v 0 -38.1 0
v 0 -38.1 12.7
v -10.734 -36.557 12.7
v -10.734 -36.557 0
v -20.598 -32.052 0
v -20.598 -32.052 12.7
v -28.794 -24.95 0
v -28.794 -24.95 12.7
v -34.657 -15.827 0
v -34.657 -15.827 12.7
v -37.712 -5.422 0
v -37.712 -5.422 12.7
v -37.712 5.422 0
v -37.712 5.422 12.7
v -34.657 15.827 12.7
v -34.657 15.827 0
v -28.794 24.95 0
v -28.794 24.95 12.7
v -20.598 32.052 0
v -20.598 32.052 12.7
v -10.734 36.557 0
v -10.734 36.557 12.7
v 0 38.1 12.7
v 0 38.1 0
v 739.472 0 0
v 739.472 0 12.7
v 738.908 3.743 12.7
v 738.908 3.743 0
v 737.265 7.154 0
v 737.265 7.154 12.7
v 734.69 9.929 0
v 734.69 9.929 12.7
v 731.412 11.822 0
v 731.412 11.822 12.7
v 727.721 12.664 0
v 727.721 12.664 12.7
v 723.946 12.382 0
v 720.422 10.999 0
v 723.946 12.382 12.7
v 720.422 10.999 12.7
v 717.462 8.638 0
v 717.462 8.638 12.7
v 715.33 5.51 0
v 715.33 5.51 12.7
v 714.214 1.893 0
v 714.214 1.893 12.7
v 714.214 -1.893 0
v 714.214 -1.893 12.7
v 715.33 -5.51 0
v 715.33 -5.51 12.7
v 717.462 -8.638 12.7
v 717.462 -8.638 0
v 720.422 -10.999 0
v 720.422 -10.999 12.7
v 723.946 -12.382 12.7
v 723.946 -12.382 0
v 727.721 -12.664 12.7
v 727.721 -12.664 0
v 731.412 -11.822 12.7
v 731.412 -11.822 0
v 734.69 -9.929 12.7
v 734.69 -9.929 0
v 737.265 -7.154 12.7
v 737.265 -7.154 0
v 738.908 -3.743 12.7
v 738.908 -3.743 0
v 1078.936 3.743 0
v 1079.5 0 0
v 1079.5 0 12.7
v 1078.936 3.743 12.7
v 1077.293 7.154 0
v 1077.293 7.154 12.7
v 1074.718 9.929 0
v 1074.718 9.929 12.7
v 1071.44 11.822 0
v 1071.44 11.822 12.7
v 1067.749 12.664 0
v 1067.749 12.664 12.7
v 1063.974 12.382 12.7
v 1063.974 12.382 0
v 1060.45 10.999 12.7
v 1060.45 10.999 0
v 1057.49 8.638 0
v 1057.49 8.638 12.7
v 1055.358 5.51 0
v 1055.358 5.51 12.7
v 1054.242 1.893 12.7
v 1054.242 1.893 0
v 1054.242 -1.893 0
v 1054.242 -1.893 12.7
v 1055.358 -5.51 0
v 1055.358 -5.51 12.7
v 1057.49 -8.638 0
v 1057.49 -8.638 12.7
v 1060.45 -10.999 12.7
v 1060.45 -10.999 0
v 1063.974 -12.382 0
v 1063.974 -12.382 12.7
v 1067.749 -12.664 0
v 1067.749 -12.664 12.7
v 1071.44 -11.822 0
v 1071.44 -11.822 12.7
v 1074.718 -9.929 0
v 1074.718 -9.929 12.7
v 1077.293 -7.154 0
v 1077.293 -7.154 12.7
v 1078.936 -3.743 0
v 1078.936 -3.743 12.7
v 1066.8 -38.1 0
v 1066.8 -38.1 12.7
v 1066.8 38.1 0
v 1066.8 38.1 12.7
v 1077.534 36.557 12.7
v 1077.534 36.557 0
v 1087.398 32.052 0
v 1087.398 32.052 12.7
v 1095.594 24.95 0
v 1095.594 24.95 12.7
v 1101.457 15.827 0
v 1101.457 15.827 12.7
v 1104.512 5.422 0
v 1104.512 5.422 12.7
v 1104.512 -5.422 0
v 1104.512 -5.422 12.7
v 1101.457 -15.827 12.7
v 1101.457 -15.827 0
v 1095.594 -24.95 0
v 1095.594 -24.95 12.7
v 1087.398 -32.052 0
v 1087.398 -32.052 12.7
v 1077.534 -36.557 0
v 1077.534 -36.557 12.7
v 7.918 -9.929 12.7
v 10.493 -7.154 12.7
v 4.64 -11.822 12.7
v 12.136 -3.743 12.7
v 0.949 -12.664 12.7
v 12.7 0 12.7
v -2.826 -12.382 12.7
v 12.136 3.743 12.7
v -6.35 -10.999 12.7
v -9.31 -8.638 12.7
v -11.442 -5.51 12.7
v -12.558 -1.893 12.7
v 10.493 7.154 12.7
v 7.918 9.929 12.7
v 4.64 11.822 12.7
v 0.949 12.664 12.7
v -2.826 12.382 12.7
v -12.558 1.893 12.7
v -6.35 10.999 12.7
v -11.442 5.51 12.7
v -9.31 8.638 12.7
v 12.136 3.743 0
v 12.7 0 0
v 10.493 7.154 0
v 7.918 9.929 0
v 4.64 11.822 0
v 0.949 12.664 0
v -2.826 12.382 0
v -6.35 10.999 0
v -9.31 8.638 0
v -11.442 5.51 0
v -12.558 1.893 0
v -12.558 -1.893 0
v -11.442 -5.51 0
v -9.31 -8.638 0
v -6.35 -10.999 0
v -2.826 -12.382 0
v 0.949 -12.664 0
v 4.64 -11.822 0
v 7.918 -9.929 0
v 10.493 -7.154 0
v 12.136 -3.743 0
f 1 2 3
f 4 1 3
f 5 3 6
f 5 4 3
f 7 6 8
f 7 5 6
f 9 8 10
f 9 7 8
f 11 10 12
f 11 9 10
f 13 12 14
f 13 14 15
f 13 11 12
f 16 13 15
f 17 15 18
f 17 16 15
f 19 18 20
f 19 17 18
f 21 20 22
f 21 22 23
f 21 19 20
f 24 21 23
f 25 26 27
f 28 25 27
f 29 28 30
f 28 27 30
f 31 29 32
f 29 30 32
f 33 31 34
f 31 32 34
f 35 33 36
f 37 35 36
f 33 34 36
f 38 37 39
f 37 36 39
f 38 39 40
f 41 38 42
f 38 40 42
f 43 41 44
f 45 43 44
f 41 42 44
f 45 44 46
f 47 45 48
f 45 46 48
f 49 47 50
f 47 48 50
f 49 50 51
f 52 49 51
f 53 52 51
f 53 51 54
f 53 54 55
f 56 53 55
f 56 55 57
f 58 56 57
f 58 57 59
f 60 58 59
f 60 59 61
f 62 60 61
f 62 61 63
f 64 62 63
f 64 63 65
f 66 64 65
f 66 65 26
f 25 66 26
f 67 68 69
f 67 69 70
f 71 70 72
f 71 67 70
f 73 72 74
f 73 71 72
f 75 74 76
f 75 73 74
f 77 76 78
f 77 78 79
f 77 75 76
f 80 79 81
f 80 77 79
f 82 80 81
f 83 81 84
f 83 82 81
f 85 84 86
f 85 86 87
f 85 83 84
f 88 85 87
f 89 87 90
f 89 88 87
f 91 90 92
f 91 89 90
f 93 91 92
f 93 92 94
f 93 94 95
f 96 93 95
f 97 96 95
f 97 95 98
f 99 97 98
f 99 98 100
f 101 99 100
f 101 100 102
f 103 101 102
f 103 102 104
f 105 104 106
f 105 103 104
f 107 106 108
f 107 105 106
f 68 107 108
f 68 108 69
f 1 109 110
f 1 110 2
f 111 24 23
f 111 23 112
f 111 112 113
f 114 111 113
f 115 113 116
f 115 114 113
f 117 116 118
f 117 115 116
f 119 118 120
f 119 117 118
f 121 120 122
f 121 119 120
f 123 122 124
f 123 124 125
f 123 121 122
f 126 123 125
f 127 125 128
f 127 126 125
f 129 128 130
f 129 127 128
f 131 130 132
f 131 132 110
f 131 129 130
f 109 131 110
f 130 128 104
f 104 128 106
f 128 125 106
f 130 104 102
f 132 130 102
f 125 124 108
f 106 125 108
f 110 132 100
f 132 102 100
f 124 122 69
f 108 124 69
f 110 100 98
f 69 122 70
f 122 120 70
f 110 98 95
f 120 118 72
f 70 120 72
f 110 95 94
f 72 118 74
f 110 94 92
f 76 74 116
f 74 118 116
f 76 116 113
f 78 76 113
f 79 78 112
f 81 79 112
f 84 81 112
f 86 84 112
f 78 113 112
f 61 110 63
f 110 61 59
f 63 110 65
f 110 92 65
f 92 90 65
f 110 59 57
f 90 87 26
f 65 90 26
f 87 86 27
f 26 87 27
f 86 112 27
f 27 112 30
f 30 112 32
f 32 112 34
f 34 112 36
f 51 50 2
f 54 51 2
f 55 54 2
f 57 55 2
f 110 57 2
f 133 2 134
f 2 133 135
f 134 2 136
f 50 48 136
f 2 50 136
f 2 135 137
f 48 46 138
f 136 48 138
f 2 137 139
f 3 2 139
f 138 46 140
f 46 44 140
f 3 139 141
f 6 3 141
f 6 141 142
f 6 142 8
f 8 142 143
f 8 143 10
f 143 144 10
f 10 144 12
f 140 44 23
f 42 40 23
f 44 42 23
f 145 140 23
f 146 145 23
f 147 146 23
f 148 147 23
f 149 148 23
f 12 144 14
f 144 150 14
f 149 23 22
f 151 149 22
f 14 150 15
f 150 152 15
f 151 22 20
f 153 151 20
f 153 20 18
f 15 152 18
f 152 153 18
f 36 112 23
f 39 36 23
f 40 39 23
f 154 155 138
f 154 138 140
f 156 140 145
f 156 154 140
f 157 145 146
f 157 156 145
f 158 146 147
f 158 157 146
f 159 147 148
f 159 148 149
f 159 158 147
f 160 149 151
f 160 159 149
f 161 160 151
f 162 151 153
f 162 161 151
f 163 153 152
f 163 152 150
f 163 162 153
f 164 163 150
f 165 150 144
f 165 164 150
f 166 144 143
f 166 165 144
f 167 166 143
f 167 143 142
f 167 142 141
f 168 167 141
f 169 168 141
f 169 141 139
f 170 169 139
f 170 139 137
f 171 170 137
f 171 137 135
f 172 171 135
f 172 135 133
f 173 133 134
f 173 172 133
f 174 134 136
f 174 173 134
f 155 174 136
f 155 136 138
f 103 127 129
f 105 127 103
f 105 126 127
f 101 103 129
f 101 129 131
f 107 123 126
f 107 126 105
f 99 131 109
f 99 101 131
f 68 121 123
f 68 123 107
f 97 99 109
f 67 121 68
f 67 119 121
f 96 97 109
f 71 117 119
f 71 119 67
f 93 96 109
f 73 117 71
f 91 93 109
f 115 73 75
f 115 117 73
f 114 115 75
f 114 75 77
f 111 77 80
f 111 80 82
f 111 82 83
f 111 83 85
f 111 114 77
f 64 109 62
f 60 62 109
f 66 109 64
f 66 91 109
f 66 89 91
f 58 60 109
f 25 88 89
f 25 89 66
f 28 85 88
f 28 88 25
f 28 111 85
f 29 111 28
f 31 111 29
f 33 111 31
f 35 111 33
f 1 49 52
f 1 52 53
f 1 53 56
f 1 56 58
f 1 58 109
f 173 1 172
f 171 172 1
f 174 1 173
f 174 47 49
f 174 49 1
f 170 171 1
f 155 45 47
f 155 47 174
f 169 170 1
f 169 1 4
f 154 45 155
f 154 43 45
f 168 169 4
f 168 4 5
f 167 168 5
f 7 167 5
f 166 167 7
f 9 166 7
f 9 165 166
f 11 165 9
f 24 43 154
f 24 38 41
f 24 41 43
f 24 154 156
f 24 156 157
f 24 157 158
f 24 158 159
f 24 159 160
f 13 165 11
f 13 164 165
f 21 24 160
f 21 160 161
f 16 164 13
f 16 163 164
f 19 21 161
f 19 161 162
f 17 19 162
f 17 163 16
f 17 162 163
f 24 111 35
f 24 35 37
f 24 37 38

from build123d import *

# Parameters (mm, degrees)
SKETCH2_R           = 12.7
BOSS_EXTRUDE1_DEPTH = 12.7
SKETCH3_R           = 12.7
CUT_EXTRUDE1_DEPTH  = 13.7


with BuildPart() as part:
    # Sketch2 → Boss-Extrude1 (new body)
    with BuildSketch(Plane.XY):
        with BuildLine():
            Line((0, 38.1), (1066.8, 38.1))
            ThreePointArc((1066.8, 38.1), (1104.9, 0), (1066.8, -38.1))
            Line((1066.8, -38.1), (0, -38.1))
            ThreePointArc((0, -38.1), (-38.1, 0), (0, 38.1))
        make_face()
        Circle(SKETCH2_R, mode=Mode.SUBTRACT)
        with Locations((1066.8, 0)):
            Circle(SKETCH2_R, mode=Mode.SUBTRACT)
    extrude(amount=BOSS_EXTRUDE1_DEPTH)

    # Sketch3 → Cut-Extrude1 (cut, through all)
    with BuildSketch(Plane.XY.offset(12.7)):
        with Locations((726.772091625, 0)):
            Circle(SKETCH3_R)
    extrude(amount=-CUT_EXTRUDE1_DEPTH, mode=Mode.SUBTRACT)


solid = part.part
